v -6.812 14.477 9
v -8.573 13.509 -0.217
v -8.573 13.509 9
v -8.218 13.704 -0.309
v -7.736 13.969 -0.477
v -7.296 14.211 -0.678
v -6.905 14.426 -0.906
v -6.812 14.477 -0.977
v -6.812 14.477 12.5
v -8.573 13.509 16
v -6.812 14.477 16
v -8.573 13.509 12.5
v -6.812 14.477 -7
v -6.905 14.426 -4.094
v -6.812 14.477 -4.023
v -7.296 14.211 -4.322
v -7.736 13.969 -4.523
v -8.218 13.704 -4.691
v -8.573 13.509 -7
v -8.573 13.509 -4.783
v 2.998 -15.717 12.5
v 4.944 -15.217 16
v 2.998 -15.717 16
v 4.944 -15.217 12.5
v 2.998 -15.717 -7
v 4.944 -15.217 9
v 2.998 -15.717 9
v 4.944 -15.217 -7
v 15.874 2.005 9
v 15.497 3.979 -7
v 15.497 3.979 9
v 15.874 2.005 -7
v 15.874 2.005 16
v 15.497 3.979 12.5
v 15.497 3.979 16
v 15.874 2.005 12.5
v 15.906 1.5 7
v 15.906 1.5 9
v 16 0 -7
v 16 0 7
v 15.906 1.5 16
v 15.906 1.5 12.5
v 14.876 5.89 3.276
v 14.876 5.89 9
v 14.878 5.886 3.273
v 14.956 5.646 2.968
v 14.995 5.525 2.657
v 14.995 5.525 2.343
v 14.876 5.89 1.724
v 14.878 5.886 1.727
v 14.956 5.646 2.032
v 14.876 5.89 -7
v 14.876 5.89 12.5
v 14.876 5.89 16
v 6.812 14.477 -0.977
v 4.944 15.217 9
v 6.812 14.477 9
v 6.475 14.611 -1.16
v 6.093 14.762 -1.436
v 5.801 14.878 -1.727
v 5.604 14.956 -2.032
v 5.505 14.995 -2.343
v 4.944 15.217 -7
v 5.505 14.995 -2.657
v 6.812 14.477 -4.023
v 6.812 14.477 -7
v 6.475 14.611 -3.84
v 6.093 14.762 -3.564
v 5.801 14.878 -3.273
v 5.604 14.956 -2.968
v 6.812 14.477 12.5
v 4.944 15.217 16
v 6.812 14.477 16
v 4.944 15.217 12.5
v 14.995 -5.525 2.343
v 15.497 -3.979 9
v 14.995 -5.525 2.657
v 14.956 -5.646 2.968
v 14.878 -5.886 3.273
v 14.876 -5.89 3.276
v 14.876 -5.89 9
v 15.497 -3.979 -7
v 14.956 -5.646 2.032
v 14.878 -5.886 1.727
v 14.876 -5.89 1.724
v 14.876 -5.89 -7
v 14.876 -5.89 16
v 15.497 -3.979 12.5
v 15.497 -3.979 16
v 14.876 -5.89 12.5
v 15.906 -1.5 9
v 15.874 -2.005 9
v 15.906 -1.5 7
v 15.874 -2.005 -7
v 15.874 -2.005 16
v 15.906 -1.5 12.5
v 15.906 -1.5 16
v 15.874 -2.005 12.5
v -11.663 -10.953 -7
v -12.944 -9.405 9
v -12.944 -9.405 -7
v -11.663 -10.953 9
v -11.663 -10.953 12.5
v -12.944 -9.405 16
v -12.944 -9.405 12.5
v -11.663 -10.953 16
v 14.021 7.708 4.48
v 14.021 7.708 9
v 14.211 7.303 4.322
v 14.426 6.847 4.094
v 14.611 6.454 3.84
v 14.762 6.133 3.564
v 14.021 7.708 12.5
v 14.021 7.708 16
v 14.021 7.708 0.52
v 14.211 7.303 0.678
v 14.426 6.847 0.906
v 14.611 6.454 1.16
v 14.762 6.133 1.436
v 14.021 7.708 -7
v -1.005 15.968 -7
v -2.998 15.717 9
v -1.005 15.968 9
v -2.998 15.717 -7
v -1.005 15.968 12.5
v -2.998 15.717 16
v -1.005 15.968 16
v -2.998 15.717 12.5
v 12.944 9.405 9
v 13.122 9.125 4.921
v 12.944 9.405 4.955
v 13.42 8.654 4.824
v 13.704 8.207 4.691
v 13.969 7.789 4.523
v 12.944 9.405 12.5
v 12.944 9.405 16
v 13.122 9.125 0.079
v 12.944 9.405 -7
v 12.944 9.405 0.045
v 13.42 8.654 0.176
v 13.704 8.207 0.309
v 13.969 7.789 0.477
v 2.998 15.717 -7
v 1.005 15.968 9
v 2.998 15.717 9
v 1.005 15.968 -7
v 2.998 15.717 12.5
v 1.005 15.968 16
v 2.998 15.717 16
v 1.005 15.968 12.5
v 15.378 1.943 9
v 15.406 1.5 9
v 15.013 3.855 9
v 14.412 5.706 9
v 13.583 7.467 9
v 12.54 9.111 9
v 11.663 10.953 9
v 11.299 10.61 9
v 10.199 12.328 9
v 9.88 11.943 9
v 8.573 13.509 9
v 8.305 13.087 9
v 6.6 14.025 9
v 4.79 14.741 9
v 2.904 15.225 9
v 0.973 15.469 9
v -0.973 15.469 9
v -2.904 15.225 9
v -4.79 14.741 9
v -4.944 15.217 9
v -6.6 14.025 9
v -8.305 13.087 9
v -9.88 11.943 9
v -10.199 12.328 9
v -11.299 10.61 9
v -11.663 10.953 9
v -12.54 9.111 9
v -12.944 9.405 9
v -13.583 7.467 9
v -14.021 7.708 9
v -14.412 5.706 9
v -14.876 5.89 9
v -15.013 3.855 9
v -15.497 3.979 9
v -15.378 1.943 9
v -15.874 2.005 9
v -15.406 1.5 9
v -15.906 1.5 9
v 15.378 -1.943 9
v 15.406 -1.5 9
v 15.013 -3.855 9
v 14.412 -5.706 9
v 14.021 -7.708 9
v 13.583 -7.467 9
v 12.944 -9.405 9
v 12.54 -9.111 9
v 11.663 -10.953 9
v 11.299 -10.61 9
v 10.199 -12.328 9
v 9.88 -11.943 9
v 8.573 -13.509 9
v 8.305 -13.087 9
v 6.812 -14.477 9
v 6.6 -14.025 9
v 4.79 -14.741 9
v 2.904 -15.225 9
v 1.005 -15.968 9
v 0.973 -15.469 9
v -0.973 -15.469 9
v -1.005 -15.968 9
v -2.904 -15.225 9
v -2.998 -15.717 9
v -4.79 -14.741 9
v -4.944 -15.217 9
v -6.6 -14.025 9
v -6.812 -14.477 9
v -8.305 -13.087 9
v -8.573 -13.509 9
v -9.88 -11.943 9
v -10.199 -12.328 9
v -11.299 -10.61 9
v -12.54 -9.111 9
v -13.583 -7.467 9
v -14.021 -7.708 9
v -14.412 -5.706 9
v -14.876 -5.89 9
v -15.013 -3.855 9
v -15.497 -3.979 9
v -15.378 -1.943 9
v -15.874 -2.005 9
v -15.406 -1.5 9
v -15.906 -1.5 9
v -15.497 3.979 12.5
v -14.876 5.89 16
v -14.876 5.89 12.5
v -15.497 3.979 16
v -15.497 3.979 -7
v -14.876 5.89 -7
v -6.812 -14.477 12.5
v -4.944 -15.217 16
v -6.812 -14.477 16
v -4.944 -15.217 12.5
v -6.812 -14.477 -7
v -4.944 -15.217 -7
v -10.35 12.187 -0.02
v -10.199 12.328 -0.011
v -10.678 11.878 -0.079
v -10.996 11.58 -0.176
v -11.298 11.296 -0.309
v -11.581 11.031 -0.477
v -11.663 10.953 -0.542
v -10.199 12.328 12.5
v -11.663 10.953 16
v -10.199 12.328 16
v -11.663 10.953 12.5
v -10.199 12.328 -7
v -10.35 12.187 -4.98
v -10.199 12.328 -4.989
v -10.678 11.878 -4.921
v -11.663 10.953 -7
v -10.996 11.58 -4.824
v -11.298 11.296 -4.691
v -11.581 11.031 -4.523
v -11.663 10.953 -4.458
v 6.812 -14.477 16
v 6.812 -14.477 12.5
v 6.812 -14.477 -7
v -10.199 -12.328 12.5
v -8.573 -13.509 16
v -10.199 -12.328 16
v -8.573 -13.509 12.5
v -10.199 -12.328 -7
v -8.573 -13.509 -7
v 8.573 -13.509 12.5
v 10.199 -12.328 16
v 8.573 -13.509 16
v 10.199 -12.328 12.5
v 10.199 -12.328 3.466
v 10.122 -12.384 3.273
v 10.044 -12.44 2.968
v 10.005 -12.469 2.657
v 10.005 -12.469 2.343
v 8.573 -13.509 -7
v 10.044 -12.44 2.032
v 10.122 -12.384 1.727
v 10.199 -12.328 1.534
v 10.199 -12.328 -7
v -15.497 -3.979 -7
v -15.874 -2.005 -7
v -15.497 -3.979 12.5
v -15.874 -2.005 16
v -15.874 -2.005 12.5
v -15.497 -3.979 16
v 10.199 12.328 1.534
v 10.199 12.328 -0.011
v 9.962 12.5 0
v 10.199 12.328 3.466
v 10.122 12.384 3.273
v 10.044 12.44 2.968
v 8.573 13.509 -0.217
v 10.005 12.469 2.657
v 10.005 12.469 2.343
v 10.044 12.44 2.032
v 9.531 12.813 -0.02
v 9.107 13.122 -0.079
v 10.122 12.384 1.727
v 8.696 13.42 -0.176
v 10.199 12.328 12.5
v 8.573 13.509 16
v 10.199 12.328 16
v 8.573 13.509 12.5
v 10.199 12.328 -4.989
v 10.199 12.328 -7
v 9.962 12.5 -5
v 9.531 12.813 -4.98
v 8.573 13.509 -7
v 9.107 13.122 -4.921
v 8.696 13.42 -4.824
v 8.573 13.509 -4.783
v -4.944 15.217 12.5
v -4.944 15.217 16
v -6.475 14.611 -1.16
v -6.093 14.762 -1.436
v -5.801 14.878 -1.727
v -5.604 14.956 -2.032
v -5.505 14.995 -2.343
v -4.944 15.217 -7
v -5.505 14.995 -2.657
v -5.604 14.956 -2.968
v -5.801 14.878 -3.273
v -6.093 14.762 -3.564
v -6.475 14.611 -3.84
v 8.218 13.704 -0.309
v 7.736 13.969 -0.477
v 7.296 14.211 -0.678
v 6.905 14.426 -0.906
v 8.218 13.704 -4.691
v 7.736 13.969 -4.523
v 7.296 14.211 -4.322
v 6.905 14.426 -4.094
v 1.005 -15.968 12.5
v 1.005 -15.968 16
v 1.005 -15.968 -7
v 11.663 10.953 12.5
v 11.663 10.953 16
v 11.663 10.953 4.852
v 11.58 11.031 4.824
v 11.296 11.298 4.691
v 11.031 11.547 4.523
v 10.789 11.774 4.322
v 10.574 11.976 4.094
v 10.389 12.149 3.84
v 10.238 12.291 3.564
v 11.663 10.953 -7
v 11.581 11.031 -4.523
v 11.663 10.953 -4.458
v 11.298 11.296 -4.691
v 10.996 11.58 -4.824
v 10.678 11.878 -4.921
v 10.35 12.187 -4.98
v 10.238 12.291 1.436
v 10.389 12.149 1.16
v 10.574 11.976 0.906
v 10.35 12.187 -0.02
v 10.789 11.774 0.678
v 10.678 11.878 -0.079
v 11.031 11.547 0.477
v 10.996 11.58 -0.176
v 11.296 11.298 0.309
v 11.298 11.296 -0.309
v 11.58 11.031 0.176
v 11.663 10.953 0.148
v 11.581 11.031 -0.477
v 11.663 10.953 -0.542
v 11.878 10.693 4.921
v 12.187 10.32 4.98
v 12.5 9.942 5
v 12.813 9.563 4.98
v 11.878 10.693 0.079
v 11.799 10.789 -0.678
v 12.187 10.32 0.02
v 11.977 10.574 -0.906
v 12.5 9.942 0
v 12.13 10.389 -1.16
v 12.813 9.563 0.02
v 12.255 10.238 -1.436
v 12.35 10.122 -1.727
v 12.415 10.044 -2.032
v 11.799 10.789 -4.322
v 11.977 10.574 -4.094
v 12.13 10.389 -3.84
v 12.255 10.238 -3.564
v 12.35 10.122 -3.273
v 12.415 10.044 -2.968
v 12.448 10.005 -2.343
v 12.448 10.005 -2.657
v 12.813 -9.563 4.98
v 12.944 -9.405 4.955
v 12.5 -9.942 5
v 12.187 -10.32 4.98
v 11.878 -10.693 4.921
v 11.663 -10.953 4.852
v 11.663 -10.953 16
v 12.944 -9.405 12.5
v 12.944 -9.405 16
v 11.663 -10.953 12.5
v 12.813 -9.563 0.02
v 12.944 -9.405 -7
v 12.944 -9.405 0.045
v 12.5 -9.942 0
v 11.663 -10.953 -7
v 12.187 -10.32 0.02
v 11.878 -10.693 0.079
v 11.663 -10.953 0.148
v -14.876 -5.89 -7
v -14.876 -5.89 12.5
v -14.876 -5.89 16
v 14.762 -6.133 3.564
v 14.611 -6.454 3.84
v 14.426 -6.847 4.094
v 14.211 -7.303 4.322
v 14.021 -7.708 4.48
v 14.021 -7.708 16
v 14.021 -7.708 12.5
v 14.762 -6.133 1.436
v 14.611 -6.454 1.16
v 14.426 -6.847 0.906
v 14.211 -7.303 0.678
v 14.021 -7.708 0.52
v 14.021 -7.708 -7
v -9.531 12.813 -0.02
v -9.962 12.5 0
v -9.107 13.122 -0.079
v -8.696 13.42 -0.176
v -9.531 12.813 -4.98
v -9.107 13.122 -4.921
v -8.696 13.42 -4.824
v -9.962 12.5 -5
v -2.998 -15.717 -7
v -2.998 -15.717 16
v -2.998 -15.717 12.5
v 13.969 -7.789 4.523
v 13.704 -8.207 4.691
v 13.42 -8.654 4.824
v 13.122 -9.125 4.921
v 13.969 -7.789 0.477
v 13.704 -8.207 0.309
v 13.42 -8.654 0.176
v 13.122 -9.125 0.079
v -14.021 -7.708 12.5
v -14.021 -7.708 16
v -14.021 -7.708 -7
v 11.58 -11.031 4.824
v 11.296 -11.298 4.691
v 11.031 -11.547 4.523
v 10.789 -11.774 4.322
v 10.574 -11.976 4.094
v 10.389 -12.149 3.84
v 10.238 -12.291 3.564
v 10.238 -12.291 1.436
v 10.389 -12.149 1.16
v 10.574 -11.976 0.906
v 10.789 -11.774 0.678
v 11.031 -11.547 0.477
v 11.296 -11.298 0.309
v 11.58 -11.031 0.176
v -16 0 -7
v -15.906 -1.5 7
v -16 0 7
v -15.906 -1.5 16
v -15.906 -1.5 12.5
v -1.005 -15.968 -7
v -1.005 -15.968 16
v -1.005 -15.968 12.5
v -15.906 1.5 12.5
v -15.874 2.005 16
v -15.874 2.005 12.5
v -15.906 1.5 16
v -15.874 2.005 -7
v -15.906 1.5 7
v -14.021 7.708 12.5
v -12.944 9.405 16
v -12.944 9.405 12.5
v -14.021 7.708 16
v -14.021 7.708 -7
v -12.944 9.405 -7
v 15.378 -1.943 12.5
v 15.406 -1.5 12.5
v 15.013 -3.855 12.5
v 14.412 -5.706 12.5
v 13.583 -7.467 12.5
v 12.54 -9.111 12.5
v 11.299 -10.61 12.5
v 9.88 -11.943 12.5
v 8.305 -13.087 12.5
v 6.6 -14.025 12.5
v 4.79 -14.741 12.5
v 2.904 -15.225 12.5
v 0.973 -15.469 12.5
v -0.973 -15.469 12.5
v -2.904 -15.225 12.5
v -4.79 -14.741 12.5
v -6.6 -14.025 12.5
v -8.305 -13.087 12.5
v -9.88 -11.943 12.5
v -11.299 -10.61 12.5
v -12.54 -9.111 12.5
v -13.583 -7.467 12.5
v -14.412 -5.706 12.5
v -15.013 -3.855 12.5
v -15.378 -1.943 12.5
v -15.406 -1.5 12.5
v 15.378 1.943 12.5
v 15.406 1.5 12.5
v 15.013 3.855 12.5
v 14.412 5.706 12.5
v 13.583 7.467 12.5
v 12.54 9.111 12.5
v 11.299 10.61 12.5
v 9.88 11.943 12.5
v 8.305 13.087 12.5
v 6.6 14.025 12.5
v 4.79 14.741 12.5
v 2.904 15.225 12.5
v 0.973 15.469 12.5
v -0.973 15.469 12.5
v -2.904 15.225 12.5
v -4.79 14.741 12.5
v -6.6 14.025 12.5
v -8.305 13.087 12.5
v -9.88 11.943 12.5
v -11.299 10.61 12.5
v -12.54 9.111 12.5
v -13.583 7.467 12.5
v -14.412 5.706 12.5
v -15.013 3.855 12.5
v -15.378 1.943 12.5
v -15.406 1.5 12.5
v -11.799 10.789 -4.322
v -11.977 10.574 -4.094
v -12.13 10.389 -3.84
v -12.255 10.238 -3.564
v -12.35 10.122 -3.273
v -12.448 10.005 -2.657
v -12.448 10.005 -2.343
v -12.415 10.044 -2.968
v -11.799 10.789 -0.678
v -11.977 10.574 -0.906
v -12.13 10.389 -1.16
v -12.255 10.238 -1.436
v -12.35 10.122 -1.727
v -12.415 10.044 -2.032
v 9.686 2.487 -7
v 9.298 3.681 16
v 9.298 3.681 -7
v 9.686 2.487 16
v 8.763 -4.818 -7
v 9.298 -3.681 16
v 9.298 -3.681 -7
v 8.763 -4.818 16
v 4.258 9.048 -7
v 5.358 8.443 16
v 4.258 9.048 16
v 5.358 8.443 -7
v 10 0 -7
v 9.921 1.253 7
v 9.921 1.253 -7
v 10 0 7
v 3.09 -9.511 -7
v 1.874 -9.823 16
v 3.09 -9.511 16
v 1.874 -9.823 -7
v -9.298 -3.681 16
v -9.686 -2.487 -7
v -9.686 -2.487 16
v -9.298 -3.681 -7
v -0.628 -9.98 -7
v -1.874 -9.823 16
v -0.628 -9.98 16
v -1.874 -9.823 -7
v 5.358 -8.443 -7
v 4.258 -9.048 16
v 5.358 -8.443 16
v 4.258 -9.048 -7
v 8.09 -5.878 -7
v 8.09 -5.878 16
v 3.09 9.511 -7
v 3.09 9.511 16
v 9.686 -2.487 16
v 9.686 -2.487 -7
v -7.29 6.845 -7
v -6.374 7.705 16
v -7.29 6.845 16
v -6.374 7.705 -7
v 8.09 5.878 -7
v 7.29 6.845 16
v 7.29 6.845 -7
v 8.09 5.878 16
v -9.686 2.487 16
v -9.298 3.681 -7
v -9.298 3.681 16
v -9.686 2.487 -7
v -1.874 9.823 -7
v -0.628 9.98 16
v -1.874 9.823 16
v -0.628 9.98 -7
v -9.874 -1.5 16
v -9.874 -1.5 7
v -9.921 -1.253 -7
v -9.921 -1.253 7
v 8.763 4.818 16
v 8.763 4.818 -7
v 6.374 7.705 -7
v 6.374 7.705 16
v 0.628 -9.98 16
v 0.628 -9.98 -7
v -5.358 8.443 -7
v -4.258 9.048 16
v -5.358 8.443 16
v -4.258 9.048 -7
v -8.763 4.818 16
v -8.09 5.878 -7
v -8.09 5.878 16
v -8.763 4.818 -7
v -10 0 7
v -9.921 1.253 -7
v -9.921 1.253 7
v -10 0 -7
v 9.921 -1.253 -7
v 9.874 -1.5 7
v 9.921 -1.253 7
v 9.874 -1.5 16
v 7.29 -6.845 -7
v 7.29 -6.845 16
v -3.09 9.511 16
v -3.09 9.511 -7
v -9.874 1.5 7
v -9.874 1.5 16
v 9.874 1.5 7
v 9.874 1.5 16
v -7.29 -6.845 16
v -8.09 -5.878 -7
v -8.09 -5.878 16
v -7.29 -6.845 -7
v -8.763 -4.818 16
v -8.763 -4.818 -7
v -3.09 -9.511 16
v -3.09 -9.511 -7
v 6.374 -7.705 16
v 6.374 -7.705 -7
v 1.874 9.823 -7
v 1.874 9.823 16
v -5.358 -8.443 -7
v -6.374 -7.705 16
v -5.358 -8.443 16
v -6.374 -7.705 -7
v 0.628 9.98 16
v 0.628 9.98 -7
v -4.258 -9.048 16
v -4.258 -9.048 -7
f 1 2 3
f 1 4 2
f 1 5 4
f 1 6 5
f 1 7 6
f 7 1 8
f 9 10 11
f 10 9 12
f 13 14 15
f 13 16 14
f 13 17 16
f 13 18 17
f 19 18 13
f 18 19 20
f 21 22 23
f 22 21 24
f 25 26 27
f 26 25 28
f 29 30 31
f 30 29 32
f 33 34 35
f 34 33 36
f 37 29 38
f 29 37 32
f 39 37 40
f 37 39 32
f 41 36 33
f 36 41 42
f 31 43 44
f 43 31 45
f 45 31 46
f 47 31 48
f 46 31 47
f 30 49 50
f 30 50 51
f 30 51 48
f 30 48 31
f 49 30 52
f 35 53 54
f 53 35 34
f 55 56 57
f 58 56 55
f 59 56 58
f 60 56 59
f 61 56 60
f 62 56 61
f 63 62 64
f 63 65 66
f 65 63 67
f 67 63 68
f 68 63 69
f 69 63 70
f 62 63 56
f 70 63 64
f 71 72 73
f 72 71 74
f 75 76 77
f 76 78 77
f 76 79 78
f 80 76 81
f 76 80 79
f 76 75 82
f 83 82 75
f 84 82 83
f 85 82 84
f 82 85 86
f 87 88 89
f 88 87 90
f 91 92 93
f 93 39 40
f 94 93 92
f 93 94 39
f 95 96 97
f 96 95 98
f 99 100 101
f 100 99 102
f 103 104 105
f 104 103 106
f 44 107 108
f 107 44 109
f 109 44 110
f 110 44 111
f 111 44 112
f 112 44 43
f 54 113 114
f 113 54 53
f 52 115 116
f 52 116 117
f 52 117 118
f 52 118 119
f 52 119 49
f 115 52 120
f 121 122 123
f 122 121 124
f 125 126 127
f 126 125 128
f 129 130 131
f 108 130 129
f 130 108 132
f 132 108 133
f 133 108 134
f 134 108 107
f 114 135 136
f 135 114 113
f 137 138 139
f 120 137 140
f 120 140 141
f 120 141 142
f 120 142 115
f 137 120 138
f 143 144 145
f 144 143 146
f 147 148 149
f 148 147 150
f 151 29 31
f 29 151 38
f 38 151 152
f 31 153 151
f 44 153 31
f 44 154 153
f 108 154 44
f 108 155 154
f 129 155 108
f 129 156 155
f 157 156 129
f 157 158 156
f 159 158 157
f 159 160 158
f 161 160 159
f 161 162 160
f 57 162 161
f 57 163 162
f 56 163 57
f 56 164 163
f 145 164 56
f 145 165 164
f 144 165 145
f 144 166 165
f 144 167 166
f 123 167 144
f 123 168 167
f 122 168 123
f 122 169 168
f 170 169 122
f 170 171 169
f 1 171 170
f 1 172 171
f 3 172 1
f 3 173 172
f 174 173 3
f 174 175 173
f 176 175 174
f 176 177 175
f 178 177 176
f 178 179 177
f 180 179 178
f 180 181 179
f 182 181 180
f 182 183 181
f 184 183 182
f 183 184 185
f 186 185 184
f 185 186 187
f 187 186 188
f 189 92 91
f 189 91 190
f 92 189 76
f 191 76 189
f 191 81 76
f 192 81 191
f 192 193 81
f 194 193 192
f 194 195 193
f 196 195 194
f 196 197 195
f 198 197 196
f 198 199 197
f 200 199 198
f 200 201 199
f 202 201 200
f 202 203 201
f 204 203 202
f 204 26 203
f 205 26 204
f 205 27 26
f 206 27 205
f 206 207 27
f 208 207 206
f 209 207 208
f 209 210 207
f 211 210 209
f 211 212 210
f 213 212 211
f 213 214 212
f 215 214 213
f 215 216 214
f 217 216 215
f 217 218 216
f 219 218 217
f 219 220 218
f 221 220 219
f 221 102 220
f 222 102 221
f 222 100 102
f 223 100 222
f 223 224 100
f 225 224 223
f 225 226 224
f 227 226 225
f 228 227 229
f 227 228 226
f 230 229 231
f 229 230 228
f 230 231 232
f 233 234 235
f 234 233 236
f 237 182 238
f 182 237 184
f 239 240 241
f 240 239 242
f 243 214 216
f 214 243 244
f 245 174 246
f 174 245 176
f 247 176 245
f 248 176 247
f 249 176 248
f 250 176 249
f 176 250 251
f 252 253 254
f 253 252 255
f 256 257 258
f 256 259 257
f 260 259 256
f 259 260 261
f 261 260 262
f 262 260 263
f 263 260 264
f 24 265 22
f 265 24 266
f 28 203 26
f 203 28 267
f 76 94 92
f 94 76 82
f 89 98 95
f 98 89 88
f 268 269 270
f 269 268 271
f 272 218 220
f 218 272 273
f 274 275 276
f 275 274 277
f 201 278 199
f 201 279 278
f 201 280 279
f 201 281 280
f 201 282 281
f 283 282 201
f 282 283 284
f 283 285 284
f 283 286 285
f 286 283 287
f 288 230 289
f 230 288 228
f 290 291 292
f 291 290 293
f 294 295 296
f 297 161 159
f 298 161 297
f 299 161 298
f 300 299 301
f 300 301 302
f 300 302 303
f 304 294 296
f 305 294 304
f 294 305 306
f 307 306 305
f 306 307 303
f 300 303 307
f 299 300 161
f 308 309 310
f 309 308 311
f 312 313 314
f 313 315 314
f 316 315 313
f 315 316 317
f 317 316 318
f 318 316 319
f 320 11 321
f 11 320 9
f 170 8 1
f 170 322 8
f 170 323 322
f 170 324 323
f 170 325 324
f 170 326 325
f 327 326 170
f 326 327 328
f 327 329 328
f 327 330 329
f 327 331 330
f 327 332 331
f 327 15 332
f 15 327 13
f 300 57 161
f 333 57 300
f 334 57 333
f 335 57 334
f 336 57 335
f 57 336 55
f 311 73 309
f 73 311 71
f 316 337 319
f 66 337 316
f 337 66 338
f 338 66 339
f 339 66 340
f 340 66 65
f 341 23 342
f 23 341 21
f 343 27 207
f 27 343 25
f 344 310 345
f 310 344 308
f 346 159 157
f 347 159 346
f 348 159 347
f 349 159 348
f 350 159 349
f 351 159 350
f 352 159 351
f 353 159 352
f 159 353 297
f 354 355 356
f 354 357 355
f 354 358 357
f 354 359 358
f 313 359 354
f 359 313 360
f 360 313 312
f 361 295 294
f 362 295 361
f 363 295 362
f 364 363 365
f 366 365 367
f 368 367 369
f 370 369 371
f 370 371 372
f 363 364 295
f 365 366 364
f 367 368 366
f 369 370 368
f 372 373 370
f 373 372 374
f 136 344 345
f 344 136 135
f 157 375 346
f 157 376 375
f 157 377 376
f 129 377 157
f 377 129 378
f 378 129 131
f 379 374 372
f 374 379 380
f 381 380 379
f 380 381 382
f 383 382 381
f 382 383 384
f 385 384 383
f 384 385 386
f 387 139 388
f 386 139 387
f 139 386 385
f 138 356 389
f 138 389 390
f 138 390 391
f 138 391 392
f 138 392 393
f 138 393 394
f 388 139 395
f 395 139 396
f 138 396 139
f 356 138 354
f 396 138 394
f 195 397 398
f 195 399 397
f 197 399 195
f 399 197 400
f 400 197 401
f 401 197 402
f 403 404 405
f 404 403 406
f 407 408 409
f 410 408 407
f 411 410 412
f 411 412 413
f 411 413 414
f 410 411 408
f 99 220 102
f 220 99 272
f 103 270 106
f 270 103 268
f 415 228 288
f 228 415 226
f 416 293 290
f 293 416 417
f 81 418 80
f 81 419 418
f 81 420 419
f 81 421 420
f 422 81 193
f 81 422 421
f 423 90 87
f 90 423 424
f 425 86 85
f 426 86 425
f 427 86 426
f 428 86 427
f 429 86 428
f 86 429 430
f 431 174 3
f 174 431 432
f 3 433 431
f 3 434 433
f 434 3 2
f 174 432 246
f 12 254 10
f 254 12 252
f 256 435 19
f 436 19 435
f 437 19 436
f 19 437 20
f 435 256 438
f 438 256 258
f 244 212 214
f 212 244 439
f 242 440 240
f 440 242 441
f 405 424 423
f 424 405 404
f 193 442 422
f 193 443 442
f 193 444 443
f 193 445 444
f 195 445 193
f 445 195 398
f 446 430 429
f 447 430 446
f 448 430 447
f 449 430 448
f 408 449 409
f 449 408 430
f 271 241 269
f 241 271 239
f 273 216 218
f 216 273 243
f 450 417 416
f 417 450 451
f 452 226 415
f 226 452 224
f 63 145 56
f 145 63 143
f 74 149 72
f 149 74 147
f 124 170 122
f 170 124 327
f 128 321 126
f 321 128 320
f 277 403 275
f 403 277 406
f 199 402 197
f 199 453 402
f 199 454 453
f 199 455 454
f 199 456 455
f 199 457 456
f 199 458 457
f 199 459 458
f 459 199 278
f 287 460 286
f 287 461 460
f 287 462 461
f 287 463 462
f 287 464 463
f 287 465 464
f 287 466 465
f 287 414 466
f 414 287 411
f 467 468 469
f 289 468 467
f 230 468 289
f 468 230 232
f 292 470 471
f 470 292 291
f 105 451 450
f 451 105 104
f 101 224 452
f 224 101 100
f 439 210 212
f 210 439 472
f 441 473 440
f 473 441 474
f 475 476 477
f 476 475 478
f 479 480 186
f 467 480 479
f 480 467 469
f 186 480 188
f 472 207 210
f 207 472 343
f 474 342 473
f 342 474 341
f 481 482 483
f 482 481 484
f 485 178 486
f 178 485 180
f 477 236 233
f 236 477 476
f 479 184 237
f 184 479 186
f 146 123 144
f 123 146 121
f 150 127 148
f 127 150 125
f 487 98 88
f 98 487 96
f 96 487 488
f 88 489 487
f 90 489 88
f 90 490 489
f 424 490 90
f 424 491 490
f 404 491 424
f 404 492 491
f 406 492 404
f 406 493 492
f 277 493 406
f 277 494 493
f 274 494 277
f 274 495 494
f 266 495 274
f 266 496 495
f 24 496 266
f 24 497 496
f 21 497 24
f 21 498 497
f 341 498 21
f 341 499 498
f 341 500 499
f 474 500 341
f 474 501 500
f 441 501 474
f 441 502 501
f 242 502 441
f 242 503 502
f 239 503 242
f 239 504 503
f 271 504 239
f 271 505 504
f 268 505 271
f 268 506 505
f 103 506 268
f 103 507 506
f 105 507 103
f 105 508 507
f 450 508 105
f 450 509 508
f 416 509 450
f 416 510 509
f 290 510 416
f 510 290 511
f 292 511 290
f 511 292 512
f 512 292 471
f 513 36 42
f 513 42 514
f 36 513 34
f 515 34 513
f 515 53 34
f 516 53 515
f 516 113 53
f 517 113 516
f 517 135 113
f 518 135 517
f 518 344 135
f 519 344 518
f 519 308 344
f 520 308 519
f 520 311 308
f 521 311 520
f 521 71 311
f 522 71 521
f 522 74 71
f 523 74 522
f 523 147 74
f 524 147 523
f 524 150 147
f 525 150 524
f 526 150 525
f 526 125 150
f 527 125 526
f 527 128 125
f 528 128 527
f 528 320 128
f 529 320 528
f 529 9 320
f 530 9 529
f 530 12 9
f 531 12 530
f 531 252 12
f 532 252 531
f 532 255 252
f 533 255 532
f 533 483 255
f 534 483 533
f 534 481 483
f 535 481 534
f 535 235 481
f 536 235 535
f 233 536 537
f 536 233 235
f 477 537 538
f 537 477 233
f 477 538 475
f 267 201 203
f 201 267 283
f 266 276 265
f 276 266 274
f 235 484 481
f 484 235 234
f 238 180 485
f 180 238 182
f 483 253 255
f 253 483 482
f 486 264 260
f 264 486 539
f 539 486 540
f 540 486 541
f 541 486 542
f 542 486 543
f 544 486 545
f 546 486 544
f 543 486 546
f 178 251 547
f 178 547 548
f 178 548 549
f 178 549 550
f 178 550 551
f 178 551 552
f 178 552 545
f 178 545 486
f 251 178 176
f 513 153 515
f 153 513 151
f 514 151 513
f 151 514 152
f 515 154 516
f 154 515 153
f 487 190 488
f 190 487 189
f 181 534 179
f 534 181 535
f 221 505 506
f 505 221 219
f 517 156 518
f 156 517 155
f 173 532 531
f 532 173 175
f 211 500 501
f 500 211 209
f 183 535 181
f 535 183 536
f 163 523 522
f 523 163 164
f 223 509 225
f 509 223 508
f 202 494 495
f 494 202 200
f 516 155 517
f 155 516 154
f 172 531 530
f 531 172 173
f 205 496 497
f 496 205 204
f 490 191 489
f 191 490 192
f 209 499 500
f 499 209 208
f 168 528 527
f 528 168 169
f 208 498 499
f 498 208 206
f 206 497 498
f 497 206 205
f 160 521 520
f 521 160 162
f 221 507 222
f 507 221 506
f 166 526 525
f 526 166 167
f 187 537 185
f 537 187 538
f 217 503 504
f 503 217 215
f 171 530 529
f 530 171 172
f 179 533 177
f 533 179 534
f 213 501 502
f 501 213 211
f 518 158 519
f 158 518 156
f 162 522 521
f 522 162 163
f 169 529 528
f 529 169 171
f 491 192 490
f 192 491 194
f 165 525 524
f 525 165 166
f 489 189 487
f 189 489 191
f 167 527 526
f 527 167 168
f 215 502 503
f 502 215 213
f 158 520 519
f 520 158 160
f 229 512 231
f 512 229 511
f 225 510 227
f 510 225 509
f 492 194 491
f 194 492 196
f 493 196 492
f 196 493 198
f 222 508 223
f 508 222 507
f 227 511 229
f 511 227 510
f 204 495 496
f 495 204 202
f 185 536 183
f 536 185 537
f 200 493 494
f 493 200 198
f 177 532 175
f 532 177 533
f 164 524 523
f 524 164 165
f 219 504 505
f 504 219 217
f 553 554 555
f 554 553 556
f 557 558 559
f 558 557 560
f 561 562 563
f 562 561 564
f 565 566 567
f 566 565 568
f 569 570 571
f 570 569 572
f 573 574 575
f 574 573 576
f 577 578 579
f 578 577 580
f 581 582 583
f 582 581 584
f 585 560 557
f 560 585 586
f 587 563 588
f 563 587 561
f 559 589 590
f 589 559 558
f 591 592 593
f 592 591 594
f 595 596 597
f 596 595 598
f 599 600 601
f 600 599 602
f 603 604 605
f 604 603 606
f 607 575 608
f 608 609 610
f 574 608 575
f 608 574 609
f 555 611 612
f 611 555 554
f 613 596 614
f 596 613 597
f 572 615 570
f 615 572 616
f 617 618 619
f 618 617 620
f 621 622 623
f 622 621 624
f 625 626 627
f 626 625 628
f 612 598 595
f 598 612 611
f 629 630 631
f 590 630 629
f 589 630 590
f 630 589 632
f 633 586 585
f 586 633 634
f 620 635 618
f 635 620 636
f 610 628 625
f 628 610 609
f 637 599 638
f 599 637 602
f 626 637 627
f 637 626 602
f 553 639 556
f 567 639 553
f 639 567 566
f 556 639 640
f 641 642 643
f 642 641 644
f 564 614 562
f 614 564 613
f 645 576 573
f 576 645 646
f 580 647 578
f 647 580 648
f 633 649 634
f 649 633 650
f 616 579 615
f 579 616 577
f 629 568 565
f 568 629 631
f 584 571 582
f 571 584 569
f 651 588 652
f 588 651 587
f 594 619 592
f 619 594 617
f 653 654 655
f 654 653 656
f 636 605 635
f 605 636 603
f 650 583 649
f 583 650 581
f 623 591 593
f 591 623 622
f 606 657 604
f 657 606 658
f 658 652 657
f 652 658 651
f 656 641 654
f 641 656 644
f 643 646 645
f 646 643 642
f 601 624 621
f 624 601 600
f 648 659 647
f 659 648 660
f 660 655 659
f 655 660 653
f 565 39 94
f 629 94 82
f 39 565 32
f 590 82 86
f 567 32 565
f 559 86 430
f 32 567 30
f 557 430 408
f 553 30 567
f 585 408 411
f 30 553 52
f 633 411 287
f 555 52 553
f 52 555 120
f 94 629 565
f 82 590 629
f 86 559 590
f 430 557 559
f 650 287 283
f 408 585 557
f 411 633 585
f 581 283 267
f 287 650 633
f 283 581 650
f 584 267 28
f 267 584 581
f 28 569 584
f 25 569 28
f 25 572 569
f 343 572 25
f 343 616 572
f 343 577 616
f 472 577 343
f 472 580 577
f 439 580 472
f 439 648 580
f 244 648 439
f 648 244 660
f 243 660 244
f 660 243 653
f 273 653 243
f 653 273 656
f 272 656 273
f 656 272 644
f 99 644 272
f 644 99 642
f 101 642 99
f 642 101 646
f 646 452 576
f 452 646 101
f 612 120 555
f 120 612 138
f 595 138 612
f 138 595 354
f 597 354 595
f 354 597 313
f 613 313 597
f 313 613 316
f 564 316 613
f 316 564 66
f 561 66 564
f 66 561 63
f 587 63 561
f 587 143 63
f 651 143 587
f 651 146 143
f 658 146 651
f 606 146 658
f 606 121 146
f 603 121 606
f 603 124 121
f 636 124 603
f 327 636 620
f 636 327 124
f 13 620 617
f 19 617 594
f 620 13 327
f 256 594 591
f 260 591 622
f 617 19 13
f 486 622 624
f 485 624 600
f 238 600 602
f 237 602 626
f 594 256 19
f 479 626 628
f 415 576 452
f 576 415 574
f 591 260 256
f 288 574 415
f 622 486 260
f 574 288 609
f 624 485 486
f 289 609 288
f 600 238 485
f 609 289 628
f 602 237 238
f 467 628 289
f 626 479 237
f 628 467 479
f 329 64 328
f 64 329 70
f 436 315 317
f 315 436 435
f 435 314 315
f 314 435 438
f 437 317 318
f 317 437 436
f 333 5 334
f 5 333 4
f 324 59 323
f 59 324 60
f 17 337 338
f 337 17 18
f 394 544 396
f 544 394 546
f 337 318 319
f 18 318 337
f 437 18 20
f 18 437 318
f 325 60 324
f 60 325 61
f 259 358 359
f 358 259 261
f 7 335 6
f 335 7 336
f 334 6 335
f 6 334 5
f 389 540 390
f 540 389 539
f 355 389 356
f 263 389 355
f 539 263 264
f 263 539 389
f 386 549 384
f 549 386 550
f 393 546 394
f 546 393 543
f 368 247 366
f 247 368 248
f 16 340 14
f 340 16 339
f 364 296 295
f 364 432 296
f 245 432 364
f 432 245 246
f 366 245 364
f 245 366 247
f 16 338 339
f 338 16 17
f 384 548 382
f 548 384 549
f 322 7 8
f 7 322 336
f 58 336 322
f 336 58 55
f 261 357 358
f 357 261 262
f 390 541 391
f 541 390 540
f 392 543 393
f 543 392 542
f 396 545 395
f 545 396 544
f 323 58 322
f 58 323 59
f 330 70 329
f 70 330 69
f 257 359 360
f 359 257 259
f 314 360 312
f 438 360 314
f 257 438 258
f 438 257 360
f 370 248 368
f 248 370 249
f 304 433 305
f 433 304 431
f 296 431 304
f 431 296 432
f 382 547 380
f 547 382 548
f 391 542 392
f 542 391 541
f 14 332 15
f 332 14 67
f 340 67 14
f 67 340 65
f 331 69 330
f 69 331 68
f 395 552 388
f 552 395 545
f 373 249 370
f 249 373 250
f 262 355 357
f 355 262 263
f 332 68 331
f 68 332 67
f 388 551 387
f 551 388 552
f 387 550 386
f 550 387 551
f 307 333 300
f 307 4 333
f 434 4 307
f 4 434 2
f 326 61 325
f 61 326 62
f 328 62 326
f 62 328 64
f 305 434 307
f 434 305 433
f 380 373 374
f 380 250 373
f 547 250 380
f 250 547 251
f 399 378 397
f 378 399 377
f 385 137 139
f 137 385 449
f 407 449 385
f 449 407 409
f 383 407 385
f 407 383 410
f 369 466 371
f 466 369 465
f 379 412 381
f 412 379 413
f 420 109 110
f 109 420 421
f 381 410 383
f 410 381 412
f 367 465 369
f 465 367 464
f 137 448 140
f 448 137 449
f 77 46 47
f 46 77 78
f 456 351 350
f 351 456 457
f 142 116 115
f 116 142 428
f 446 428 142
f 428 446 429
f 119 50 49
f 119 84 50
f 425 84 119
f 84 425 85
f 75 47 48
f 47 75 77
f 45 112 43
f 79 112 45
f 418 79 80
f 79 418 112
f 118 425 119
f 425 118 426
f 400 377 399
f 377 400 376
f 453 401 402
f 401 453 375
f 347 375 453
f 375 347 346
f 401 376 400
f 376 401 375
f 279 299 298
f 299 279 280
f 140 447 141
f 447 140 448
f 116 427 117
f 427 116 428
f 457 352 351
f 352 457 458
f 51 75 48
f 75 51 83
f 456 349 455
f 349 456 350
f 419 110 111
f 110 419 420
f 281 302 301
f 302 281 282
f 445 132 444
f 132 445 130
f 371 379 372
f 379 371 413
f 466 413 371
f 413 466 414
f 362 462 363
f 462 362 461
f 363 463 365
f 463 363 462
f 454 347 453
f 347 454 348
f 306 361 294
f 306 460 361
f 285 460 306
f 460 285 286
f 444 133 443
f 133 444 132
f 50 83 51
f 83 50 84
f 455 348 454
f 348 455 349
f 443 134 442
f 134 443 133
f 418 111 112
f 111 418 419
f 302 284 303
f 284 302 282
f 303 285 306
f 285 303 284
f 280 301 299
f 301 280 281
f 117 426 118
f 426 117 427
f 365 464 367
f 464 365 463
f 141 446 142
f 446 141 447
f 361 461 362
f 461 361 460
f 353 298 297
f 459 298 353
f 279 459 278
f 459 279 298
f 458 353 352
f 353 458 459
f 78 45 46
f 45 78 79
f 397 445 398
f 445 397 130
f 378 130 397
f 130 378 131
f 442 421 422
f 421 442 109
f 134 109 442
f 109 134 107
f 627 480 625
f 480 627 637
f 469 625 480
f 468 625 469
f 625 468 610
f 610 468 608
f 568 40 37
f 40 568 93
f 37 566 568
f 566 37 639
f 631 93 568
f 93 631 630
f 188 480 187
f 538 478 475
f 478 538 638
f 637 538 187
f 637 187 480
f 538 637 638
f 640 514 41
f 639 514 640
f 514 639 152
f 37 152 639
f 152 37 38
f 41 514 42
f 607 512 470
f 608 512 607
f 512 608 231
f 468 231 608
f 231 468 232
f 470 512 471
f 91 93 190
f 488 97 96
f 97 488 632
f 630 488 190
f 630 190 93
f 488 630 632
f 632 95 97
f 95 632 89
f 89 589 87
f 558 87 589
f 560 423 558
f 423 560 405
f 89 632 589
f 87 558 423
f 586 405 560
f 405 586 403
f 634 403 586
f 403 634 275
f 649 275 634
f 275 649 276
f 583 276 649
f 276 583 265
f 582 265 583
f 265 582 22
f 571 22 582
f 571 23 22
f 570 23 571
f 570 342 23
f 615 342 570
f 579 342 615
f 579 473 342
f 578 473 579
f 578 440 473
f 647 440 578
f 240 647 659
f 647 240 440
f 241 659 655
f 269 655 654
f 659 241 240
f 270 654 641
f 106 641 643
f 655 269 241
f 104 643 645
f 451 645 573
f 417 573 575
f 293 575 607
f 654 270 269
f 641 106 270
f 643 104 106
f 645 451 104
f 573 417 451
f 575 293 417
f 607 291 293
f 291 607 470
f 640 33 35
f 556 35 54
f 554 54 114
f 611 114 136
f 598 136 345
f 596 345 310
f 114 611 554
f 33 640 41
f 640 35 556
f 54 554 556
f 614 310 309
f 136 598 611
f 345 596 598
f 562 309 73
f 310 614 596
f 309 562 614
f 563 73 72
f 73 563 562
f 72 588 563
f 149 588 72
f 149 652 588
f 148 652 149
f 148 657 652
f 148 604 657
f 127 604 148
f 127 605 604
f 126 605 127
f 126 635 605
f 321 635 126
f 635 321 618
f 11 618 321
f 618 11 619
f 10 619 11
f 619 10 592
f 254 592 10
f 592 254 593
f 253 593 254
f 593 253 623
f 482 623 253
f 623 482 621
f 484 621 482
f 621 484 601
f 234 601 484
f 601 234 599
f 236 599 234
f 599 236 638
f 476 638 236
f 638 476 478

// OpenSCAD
//Yagi element to mast mounting bracket
//Satnogs Project MPL2.0 http://satnogs.org

$fn=50; //High Resolution

el_d = 5; 					   //Element diameter
mast_d = 20; 					//Mast diameter
cube_e = mast_d+el_d*2+2;  //Cube edge
mount_l = 14; 					//Mount length

module satnogs_yagi_mount()

{
	rotate([0,90,0])
		intersection() {
			difference() {
				translate([-cube_e/2,-cube_e/2,-cube_e/2])
					cube([cube_e,cube_e,cube_e]);
			   union() {
					rotate([0,270,0])
						translate([0,0,-mount_l/2])
							cylinder(h=mount_l*2,d=mast_d);
				   translate([el_d/2,mast_d/2+el_d/2,-mast_d])
						cylinder(h=mast_d*2,d=el_d);
					rotate([90,0,0])
						translate([-el_d/2,mast_d/2+el_d/2,-mast_d])
							cylinder(h=mast_d*2,d=el_d);
					translate([-mount_l*1.5,-1.5,-(mast_d+el_d*2+2)/2])
						cube([mount_l,3,mast_d+el_d*2+2]);
					rotate([0,270,0])
						translate([0,0,mount_l-5])
							difference() {
								cylinder(h=3.5,d=cube_e);
								cylinder(h=3.5,d=cube_e-1);
							}
				}
			}
		   rotate([0,270,0])
				translate([0,0,-mount_l/2])
					cylinder(h=mount_l*2,d=mast_d+el_d*2+2);
		}

}

satnogs_yagi_mount();
